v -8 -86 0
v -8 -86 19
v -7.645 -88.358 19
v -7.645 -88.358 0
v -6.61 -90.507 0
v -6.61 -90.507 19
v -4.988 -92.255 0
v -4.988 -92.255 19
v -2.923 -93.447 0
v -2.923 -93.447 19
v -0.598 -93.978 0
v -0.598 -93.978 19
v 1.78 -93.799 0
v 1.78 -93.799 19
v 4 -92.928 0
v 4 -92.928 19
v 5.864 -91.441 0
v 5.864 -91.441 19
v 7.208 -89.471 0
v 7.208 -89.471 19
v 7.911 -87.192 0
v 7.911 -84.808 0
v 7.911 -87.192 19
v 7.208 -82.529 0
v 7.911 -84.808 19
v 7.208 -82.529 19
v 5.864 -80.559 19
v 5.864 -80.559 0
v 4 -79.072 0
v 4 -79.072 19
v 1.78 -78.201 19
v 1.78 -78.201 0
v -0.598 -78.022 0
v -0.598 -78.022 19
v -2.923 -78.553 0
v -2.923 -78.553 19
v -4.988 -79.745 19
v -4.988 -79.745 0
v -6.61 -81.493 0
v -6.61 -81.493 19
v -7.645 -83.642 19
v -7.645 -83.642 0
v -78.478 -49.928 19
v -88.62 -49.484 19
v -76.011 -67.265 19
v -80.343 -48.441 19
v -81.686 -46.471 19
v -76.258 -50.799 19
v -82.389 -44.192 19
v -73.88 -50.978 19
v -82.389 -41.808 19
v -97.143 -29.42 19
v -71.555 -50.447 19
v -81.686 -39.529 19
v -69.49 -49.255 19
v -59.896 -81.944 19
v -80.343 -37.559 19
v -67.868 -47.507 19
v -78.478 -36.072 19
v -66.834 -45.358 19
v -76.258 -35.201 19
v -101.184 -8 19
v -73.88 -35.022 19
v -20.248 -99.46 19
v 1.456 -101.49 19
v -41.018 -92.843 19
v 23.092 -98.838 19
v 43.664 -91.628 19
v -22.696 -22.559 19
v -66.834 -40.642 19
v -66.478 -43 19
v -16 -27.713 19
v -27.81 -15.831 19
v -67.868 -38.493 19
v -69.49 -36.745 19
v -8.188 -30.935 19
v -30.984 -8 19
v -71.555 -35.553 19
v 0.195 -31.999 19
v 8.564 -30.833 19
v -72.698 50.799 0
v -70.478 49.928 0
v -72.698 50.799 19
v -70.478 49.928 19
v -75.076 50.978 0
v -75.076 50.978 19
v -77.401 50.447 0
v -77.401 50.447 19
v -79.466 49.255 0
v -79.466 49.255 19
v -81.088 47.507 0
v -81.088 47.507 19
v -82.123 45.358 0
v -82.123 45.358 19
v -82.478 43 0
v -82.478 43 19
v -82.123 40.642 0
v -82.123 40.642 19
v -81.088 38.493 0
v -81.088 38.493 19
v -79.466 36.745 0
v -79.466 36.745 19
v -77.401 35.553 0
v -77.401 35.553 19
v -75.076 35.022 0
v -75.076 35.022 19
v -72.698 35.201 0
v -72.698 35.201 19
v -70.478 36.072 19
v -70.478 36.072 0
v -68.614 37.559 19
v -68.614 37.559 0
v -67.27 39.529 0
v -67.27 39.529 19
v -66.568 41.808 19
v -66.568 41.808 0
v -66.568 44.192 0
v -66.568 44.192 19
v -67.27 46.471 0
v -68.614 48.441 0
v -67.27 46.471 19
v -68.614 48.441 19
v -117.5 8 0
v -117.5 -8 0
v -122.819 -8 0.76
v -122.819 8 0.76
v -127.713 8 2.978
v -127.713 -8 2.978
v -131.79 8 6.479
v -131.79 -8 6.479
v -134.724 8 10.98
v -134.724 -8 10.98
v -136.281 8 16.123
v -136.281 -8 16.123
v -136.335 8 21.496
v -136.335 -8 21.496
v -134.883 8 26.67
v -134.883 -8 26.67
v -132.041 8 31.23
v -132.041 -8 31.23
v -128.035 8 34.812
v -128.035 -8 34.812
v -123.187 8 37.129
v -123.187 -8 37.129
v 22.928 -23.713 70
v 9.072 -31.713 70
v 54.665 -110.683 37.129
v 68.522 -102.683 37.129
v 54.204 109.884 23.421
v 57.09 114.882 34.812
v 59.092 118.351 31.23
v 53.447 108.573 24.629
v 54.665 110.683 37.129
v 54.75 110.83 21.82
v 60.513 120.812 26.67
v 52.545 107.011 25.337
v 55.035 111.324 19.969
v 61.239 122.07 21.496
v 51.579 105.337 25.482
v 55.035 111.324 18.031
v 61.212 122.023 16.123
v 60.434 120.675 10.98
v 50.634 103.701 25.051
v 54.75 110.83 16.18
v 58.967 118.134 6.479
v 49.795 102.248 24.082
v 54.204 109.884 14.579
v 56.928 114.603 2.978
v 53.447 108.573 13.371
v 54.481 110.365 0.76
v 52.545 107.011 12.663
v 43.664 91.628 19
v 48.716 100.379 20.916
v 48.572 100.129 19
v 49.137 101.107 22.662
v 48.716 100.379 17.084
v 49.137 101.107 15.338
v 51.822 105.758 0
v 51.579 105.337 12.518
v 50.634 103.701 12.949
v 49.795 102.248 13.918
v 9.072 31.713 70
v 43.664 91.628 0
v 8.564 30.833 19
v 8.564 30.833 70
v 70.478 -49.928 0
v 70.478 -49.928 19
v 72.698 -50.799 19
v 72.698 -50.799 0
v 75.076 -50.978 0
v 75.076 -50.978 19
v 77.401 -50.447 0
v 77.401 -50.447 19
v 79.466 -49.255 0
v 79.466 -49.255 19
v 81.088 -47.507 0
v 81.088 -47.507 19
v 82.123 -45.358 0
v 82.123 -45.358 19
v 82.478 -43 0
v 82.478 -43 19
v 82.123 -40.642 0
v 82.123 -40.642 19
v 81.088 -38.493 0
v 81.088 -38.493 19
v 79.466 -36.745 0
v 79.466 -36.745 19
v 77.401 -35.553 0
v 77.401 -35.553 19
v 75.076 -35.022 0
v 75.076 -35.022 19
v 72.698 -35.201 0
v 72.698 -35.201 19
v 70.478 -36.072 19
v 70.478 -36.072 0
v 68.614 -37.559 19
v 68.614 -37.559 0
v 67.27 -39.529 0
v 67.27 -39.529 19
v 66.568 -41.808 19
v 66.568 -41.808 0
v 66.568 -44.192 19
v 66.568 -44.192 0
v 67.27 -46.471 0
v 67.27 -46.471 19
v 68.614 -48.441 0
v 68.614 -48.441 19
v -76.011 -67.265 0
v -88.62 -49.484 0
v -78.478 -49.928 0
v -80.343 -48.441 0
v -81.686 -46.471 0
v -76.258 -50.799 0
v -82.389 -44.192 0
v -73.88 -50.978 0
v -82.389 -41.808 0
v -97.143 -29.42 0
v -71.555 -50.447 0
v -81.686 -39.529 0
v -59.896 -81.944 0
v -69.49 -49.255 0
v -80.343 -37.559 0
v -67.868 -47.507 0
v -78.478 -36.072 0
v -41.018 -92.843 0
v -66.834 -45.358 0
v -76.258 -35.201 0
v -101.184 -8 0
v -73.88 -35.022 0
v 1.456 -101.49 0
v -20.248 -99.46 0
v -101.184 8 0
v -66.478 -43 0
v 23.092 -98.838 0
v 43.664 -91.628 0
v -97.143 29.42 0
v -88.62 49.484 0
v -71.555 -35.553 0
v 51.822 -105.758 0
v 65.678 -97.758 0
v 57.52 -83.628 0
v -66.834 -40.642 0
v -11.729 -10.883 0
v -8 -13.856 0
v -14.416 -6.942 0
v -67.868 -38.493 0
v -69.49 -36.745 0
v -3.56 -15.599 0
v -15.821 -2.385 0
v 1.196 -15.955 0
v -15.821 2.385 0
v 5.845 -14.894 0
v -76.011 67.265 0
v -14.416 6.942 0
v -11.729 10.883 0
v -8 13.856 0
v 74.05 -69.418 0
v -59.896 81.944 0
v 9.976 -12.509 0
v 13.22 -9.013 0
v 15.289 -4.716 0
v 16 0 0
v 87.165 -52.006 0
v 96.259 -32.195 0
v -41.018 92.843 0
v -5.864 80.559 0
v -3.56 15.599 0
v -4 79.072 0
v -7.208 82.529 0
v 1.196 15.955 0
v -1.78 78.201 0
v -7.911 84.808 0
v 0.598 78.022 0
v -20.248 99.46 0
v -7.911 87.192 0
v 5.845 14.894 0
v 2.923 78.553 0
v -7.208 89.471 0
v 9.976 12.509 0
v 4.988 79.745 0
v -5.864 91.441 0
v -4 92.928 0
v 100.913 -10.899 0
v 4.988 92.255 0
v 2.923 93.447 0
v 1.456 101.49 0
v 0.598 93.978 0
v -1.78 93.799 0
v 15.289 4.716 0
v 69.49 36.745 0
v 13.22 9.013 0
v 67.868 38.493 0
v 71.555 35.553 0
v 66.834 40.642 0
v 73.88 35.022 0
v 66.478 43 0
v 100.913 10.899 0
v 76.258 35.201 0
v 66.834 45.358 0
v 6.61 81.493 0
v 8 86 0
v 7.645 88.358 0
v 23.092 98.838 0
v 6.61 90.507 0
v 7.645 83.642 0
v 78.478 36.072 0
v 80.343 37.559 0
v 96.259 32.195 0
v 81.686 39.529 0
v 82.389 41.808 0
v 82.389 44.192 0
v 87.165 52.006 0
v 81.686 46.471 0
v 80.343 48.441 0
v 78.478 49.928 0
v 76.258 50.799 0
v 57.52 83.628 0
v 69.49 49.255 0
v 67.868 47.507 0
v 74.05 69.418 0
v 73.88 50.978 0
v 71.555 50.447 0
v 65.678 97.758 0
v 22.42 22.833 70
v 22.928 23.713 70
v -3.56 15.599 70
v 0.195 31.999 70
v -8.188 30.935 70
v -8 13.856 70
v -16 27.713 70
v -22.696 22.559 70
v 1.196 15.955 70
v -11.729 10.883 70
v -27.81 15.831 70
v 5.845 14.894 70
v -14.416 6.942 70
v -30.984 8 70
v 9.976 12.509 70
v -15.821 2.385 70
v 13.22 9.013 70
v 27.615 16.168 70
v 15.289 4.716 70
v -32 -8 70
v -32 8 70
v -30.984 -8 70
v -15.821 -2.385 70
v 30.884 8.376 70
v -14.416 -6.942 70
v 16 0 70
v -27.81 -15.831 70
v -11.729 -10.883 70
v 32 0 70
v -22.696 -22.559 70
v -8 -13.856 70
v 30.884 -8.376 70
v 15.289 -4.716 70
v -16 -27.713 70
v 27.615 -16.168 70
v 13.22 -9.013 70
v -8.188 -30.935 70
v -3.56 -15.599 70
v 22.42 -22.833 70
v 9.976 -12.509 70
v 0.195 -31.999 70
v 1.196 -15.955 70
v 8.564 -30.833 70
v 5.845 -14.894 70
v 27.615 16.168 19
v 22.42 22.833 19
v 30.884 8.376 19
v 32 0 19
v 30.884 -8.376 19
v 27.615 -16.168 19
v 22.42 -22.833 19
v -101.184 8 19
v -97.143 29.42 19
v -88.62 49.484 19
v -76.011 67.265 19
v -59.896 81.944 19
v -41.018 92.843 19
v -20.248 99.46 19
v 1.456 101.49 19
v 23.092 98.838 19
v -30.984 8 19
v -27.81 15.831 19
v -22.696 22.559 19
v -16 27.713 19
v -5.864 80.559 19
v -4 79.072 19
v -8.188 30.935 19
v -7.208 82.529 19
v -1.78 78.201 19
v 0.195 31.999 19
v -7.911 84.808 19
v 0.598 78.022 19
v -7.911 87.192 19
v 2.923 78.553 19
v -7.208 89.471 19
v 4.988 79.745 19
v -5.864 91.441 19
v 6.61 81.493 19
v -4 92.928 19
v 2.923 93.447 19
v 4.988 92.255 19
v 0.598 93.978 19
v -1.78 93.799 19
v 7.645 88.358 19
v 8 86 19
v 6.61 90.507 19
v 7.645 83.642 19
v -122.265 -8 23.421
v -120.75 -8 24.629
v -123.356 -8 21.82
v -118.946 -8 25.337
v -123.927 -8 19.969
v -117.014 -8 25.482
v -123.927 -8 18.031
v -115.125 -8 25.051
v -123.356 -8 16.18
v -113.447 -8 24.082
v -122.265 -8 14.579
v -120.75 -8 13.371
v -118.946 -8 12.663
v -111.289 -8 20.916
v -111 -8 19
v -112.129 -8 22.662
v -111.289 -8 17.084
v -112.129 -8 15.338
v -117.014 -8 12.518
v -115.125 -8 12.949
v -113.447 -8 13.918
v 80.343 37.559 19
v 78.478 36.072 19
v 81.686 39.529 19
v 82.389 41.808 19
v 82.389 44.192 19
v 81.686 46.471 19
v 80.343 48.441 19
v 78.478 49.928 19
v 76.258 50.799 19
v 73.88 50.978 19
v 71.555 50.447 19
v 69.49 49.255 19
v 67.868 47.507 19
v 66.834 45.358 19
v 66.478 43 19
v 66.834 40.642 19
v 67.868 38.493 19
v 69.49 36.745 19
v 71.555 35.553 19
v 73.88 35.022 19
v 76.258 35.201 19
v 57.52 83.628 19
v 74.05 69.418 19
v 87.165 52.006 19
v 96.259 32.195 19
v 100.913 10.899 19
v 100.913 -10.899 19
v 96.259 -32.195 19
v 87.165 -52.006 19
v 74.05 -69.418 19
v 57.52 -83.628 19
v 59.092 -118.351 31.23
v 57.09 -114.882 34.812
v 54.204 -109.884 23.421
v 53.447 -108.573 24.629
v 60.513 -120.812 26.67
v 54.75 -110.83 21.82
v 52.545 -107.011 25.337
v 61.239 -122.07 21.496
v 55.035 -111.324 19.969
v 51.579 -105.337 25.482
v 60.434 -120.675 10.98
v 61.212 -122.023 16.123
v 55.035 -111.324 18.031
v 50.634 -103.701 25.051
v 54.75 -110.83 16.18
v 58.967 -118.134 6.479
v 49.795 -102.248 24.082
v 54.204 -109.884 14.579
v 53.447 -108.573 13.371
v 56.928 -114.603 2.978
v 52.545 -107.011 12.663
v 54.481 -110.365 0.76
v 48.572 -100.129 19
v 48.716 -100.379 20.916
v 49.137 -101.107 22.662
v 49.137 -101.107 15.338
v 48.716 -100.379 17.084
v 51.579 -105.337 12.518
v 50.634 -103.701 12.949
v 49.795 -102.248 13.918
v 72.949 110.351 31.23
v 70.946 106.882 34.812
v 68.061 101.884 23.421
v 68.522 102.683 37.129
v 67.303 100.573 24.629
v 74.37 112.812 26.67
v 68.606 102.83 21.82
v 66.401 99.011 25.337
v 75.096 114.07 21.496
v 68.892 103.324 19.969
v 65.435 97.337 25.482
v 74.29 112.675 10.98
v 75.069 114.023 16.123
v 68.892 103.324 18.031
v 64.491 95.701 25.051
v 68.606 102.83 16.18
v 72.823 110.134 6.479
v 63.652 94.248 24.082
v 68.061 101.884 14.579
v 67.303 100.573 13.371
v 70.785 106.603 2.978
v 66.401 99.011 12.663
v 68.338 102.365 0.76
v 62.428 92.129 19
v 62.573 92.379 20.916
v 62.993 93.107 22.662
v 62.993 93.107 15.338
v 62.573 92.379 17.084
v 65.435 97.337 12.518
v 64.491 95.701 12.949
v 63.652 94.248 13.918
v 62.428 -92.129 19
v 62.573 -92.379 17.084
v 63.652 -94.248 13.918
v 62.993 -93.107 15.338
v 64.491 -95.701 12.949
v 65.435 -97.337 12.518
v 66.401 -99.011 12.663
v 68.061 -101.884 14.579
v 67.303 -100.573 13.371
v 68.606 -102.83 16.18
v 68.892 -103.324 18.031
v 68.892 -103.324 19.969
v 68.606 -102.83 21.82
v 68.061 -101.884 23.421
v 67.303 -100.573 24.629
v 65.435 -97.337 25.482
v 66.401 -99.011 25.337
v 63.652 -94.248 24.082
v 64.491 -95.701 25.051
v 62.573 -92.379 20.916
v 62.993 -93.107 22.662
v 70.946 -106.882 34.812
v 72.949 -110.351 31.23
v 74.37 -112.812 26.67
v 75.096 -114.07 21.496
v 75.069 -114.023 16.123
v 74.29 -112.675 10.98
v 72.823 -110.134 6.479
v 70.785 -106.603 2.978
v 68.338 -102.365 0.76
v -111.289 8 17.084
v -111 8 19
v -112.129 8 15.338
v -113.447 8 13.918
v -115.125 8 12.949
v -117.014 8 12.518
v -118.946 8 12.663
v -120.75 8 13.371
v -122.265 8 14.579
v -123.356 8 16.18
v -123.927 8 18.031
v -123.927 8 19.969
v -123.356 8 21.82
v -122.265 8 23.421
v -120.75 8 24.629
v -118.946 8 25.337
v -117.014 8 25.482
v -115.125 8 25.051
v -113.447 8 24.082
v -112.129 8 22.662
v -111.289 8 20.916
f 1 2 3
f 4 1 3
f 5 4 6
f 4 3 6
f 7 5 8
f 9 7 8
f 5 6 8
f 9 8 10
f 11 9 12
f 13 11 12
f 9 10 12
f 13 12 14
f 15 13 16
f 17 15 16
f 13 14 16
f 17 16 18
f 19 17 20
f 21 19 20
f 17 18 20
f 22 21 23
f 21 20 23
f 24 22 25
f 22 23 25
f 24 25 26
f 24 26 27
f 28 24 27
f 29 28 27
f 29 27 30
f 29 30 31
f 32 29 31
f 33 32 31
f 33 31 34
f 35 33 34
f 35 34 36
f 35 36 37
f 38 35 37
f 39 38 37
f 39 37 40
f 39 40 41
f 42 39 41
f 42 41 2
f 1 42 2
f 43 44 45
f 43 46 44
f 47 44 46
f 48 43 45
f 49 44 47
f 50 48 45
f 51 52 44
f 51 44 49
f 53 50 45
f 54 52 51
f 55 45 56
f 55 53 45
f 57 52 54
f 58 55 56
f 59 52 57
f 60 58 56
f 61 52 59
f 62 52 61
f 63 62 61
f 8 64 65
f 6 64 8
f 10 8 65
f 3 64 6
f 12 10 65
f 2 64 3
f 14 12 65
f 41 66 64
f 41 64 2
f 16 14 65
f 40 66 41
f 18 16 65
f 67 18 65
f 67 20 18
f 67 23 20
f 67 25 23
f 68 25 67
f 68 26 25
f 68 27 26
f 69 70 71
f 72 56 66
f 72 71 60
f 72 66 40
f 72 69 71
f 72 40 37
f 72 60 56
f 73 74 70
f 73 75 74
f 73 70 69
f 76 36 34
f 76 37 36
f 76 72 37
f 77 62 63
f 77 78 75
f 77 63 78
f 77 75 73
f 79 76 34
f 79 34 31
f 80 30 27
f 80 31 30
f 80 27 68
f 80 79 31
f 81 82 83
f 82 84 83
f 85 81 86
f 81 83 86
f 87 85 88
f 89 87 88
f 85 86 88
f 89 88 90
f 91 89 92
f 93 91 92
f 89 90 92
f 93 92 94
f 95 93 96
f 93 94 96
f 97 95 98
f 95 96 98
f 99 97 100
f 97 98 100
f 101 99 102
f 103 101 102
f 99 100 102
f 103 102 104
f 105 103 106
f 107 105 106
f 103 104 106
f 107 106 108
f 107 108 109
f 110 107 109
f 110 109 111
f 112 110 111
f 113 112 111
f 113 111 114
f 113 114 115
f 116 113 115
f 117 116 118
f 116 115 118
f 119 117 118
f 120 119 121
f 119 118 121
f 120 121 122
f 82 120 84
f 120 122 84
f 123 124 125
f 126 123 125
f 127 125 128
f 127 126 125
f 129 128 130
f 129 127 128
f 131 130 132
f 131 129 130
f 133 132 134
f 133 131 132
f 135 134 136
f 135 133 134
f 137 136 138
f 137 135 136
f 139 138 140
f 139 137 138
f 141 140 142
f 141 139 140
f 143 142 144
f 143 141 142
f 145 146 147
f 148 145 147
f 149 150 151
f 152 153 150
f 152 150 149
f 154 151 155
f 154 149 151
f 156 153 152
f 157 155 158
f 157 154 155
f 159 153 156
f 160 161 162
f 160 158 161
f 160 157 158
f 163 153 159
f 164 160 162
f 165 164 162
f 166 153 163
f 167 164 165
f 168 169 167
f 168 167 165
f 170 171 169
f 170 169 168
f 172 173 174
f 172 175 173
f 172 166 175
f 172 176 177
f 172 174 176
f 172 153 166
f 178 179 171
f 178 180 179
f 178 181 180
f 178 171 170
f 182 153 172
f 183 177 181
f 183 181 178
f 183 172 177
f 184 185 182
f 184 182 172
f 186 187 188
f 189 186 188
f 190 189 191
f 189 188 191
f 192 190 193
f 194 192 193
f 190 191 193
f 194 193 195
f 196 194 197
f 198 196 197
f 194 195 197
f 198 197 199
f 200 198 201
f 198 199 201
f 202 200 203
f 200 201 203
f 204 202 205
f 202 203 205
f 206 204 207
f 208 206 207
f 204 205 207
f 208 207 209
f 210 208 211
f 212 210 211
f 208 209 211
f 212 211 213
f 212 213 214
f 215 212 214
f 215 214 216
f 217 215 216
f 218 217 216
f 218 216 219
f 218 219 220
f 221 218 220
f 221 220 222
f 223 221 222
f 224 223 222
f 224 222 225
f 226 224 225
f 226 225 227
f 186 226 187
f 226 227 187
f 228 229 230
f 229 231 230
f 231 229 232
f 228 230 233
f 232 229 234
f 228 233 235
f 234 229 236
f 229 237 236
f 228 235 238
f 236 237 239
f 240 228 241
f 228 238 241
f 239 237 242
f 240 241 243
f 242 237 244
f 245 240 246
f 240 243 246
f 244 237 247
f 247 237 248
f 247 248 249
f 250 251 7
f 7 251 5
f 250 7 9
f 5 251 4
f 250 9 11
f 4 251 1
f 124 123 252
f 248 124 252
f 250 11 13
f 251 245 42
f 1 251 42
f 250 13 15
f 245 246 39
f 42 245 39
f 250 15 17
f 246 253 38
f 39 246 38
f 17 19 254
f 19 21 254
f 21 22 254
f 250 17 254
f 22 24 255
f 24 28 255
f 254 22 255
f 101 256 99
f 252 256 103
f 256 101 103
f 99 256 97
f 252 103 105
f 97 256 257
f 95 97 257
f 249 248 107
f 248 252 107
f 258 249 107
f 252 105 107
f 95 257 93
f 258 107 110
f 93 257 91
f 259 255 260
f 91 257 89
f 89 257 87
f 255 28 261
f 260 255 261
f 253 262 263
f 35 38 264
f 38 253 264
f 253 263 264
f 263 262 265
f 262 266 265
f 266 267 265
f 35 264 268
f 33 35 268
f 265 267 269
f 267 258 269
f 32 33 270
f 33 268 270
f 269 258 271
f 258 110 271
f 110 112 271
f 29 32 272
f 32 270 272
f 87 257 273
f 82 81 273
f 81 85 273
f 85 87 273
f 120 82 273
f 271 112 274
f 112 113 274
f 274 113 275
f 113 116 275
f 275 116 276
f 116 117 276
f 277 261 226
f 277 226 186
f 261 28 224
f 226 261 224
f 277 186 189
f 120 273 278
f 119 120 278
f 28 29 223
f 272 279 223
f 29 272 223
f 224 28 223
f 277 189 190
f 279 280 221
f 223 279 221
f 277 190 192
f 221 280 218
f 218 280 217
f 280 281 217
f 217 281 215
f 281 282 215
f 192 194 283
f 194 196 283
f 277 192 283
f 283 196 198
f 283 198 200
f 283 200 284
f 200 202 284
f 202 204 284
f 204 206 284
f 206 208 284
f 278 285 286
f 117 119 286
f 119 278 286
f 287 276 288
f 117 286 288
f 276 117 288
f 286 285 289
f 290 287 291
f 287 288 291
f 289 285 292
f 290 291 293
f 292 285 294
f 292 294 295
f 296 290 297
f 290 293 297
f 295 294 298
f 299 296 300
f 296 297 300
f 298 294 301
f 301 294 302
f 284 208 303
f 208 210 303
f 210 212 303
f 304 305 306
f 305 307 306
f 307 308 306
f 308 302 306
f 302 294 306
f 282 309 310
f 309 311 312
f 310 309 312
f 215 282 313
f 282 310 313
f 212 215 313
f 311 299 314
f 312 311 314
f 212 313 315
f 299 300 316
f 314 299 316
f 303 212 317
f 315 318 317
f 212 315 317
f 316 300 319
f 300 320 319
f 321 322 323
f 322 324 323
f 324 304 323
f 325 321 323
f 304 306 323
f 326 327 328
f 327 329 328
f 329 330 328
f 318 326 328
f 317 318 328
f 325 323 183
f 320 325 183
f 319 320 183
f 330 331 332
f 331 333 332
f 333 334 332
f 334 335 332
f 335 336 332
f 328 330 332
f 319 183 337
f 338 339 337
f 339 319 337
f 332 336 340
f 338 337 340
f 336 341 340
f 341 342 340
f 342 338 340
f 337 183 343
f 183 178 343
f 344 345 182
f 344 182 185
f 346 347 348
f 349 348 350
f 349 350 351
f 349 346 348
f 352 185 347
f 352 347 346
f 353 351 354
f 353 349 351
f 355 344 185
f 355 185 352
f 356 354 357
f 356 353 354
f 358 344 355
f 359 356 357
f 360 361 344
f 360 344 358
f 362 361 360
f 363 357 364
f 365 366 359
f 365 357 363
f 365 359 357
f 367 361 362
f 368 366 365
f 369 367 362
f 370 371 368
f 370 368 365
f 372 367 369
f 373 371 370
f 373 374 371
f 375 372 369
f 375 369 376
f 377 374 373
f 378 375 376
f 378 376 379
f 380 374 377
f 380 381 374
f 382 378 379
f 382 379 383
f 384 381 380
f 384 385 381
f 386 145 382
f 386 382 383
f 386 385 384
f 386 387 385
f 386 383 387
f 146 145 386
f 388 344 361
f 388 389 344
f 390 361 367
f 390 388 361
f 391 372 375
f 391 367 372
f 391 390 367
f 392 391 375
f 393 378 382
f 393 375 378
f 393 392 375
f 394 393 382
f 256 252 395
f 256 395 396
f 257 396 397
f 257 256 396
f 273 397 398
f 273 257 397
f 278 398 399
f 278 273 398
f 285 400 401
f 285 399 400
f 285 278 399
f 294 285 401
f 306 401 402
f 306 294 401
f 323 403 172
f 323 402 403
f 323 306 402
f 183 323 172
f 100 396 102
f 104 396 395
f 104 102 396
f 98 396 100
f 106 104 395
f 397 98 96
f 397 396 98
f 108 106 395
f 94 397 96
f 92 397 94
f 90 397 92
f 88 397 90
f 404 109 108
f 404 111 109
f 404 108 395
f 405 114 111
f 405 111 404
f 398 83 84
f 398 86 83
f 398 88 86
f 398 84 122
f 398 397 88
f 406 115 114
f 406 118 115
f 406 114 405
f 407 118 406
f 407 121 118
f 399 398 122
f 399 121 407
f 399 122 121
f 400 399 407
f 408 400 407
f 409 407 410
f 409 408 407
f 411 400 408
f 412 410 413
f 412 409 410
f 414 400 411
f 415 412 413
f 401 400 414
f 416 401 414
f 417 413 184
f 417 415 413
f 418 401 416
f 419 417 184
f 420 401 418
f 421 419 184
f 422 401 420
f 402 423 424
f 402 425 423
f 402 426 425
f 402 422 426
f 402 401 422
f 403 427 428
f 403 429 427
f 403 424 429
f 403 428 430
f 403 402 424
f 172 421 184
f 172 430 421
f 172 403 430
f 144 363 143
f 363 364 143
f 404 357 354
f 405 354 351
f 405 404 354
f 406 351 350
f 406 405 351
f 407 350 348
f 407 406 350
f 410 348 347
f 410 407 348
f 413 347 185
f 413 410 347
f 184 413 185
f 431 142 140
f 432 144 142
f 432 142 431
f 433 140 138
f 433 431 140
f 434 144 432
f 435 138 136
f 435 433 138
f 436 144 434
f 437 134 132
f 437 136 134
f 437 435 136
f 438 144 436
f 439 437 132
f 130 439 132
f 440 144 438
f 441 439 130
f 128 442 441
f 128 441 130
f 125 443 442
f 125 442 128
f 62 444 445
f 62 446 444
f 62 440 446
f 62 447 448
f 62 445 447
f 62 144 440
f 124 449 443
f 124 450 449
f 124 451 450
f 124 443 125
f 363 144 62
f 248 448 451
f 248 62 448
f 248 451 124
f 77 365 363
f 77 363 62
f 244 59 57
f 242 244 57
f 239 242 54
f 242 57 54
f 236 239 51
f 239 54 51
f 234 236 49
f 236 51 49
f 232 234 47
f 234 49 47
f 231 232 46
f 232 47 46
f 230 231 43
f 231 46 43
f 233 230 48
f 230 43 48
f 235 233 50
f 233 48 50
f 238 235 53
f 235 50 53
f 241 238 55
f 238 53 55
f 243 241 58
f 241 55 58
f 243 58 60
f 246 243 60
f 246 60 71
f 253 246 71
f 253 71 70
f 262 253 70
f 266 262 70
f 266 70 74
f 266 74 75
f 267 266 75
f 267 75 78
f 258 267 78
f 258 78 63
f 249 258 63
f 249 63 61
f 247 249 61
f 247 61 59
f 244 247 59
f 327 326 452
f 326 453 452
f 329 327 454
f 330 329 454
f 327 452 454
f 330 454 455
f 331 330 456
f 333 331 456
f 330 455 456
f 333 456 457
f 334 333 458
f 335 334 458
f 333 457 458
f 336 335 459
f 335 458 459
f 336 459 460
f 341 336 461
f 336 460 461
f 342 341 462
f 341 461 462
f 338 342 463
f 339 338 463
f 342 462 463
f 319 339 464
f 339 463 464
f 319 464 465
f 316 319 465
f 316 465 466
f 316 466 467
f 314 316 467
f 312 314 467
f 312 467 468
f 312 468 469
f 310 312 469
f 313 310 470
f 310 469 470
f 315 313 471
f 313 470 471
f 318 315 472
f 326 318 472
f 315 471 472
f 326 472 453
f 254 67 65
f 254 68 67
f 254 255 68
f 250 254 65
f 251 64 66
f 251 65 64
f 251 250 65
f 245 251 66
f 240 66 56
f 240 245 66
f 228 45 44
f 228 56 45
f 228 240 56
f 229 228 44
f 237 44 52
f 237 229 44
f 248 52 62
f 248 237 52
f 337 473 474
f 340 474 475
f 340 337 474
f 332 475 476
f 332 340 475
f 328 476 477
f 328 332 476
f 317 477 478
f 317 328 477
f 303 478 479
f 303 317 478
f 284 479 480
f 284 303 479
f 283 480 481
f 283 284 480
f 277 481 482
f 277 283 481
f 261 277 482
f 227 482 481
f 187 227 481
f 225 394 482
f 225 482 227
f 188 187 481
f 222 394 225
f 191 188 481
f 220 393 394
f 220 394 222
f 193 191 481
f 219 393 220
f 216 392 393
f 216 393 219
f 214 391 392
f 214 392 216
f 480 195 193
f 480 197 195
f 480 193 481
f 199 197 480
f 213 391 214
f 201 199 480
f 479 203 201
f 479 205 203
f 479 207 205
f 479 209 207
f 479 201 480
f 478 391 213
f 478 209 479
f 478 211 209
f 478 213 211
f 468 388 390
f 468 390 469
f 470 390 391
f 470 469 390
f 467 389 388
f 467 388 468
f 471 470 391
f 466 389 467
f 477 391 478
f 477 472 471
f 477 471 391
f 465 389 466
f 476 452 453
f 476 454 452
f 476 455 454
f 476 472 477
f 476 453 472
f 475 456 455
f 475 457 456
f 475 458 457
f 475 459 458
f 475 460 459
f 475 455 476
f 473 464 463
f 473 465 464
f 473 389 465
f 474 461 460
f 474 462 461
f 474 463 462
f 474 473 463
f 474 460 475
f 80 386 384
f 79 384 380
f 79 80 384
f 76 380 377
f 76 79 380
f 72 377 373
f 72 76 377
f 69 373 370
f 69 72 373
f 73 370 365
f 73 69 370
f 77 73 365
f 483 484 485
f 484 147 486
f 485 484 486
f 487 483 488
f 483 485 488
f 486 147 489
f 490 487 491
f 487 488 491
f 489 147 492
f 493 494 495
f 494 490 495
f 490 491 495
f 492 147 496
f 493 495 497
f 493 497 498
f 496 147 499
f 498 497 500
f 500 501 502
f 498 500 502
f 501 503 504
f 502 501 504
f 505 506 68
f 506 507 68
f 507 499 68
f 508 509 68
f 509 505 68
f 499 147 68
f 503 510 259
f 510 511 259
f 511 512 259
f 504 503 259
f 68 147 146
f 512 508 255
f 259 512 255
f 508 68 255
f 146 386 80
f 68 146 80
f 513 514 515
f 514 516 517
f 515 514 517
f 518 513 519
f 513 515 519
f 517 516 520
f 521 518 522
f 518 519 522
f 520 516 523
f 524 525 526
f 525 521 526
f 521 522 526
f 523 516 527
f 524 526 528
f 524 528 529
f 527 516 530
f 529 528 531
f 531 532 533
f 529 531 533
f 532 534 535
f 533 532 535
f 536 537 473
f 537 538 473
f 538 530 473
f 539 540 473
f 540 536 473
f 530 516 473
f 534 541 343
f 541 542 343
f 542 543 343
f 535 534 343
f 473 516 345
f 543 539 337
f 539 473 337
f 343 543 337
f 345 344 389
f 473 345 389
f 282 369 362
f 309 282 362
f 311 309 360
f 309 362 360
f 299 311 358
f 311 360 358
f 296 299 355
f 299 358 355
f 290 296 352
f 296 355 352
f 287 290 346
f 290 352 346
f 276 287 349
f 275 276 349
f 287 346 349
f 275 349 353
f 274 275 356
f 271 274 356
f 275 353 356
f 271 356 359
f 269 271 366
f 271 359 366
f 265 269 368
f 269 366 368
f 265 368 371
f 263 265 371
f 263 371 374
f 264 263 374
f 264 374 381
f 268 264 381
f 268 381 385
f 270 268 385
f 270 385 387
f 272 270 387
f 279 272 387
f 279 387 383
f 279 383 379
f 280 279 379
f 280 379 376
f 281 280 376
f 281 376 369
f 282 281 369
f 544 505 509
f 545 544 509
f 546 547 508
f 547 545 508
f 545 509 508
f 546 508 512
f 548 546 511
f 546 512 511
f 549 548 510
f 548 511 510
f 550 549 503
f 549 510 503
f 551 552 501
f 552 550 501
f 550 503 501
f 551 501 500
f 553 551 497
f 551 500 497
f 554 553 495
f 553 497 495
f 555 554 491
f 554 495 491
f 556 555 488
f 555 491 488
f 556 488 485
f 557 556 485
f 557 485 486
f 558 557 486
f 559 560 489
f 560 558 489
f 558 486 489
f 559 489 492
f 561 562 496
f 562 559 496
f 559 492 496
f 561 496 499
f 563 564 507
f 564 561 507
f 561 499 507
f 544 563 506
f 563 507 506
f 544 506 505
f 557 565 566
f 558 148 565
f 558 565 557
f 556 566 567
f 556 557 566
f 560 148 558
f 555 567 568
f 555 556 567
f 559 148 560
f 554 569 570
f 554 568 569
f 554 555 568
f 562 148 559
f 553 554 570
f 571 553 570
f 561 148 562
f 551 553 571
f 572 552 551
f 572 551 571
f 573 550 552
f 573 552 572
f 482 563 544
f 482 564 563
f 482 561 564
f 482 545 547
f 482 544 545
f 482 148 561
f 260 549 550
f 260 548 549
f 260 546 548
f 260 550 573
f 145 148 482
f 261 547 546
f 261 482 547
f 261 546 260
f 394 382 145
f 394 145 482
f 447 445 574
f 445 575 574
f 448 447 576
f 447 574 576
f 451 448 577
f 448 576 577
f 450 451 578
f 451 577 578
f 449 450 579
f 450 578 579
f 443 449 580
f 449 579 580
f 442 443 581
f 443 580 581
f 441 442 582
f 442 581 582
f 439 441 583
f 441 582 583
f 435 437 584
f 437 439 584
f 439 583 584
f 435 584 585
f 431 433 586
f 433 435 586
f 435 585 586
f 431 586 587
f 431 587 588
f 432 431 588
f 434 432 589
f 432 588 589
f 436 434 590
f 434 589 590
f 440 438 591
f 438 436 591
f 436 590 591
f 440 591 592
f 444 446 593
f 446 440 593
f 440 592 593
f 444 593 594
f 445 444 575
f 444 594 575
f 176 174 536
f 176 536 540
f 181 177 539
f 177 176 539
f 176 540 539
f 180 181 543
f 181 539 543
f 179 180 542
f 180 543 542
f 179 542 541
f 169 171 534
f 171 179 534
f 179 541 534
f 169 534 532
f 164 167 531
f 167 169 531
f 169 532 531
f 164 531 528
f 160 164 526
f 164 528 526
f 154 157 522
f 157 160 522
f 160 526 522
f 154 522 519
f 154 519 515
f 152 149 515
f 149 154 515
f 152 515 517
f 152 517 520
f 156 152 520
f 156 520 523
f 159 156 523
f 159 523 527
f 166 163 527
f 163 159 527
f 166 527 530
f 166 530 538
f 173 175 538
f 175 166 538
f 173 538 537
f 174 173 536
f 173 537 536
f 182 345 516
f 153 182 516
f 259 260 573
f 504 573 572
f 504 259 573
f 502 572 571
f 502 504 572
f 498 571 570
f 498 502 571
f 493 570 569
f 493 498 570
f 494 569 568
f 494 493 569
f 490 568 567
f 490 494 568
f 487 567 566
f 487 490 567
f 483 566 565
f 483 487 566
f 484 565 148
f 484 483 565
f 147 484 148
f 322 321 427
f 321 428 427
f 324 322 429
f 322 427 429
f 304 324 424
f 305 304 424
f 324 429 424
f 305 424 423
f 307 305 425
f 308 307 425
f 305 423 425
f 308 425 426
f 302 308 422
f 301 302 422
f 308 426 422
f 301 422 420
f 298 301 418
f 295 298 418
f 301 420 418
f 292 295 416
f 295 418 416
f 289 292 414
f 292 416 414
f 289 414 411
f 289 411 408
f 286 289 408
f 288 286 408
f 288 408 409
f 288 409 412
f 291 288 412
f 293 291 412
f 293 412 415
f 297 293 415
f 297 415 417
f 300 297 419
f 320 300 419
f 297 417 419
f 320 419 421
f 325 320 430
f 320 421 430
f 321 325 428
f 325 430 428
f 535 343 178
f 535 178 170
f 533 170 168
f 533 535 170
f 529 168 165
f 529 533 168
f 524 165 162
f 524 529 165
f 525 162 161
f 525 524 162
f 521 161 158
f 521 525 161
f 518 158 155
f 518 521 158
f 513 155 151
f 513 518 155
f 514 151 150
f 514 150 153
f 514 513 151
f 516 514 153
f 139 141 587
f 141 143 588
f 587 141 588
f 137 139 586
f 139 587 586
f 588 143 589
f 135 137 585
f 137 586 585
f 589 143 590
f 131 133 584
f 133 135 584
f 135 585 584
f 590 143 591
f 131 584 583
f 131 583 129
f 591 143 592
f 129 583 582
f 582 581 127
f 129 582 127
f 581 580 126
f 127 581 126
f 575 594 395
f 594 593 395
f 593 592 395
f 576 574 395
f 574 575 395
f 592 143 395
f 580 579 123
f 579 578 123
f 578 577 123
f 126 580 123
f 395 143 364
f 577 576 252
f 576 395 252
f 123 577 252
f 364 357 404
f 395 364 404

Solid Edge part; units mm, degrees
sketch "Sketch1" plane through (0, 0, 0) normal (0, 0, 1) x (1, 0, 0)
  circle A0 centre (0, 0) radius 101.5
extrude "Protrusion1" add sketch "Sketch1" along normal blind 19
sketch "Sketch2" plane through (0, 0, 19) normal (0, 0, 1) x (1, 0, 0)
  circle A0 centre (0, 86) radius 8
extrude "ExtrudedCutout_1" cut sketch "Sketch2" against normal blind 93.7971
pattern_circular "Pattern1" count 6 over 360 about axis through (0, 0, 19) along (0, 0, -1) of "ExtrudedCutout_1"
sketch "Sketch3" plane through (0, 0, 19) normal (0, 0, 1) x (1, 0, 0)
  circle A0 centre (0, 0) radius 32
extrude "ExtrudedProtrusion_2" add sketch "Sketch3" along normal blind 51
sketch "Sketch4" plane through (0, 0, 70) normal (0, 0, 1) x (1, 0, 0)
  circle A0 centre (0, 0) radius 16
extrude "ExtrudedCutout_2" cut sketch "Sketch4" against normal blind 138.4469
sketch "Sketch5" plane through (0, 0, 0) normal (0, -1, 0) x (1, 0, 0)
  line L0 (-32, 70) -> (-123.1874, 37.1288)
  line L1 (0, 0) -> (-117.5, 0)
  line L2 (0, 19) -> (0, 0)
  line L3 (-16, 19) -> (0, 19)
  line L4 (-16, 70) -> (-16, 19)
  line L5 (-32, 70) -> (-16, 70)
  arc A0 (-117.5, 0) -> (-123.1874, 37.1288) centre (-117.5, 19) cw
  circle A1 centre (-117.5, 19) radius 6.5
extrude "ExtrudedProtrusion_5" add sketch "Sketch5" along normal mid plane 16
pattern_circular "Pattern3" count 3 over 360 about axis through (0, 0, 19) along (0, 0, -1) of "ExtrudedProtrusion_5"
sketch "Sketch6" plane through (0, 0, 70) normal (0, 0, 1) x (1, 0, 0)
  circle A0 centre (0, 0) radius 16
extrude "ExtrudedCutout_3" cut sketch "Sketch6" along normal mid plane 22491.7976
